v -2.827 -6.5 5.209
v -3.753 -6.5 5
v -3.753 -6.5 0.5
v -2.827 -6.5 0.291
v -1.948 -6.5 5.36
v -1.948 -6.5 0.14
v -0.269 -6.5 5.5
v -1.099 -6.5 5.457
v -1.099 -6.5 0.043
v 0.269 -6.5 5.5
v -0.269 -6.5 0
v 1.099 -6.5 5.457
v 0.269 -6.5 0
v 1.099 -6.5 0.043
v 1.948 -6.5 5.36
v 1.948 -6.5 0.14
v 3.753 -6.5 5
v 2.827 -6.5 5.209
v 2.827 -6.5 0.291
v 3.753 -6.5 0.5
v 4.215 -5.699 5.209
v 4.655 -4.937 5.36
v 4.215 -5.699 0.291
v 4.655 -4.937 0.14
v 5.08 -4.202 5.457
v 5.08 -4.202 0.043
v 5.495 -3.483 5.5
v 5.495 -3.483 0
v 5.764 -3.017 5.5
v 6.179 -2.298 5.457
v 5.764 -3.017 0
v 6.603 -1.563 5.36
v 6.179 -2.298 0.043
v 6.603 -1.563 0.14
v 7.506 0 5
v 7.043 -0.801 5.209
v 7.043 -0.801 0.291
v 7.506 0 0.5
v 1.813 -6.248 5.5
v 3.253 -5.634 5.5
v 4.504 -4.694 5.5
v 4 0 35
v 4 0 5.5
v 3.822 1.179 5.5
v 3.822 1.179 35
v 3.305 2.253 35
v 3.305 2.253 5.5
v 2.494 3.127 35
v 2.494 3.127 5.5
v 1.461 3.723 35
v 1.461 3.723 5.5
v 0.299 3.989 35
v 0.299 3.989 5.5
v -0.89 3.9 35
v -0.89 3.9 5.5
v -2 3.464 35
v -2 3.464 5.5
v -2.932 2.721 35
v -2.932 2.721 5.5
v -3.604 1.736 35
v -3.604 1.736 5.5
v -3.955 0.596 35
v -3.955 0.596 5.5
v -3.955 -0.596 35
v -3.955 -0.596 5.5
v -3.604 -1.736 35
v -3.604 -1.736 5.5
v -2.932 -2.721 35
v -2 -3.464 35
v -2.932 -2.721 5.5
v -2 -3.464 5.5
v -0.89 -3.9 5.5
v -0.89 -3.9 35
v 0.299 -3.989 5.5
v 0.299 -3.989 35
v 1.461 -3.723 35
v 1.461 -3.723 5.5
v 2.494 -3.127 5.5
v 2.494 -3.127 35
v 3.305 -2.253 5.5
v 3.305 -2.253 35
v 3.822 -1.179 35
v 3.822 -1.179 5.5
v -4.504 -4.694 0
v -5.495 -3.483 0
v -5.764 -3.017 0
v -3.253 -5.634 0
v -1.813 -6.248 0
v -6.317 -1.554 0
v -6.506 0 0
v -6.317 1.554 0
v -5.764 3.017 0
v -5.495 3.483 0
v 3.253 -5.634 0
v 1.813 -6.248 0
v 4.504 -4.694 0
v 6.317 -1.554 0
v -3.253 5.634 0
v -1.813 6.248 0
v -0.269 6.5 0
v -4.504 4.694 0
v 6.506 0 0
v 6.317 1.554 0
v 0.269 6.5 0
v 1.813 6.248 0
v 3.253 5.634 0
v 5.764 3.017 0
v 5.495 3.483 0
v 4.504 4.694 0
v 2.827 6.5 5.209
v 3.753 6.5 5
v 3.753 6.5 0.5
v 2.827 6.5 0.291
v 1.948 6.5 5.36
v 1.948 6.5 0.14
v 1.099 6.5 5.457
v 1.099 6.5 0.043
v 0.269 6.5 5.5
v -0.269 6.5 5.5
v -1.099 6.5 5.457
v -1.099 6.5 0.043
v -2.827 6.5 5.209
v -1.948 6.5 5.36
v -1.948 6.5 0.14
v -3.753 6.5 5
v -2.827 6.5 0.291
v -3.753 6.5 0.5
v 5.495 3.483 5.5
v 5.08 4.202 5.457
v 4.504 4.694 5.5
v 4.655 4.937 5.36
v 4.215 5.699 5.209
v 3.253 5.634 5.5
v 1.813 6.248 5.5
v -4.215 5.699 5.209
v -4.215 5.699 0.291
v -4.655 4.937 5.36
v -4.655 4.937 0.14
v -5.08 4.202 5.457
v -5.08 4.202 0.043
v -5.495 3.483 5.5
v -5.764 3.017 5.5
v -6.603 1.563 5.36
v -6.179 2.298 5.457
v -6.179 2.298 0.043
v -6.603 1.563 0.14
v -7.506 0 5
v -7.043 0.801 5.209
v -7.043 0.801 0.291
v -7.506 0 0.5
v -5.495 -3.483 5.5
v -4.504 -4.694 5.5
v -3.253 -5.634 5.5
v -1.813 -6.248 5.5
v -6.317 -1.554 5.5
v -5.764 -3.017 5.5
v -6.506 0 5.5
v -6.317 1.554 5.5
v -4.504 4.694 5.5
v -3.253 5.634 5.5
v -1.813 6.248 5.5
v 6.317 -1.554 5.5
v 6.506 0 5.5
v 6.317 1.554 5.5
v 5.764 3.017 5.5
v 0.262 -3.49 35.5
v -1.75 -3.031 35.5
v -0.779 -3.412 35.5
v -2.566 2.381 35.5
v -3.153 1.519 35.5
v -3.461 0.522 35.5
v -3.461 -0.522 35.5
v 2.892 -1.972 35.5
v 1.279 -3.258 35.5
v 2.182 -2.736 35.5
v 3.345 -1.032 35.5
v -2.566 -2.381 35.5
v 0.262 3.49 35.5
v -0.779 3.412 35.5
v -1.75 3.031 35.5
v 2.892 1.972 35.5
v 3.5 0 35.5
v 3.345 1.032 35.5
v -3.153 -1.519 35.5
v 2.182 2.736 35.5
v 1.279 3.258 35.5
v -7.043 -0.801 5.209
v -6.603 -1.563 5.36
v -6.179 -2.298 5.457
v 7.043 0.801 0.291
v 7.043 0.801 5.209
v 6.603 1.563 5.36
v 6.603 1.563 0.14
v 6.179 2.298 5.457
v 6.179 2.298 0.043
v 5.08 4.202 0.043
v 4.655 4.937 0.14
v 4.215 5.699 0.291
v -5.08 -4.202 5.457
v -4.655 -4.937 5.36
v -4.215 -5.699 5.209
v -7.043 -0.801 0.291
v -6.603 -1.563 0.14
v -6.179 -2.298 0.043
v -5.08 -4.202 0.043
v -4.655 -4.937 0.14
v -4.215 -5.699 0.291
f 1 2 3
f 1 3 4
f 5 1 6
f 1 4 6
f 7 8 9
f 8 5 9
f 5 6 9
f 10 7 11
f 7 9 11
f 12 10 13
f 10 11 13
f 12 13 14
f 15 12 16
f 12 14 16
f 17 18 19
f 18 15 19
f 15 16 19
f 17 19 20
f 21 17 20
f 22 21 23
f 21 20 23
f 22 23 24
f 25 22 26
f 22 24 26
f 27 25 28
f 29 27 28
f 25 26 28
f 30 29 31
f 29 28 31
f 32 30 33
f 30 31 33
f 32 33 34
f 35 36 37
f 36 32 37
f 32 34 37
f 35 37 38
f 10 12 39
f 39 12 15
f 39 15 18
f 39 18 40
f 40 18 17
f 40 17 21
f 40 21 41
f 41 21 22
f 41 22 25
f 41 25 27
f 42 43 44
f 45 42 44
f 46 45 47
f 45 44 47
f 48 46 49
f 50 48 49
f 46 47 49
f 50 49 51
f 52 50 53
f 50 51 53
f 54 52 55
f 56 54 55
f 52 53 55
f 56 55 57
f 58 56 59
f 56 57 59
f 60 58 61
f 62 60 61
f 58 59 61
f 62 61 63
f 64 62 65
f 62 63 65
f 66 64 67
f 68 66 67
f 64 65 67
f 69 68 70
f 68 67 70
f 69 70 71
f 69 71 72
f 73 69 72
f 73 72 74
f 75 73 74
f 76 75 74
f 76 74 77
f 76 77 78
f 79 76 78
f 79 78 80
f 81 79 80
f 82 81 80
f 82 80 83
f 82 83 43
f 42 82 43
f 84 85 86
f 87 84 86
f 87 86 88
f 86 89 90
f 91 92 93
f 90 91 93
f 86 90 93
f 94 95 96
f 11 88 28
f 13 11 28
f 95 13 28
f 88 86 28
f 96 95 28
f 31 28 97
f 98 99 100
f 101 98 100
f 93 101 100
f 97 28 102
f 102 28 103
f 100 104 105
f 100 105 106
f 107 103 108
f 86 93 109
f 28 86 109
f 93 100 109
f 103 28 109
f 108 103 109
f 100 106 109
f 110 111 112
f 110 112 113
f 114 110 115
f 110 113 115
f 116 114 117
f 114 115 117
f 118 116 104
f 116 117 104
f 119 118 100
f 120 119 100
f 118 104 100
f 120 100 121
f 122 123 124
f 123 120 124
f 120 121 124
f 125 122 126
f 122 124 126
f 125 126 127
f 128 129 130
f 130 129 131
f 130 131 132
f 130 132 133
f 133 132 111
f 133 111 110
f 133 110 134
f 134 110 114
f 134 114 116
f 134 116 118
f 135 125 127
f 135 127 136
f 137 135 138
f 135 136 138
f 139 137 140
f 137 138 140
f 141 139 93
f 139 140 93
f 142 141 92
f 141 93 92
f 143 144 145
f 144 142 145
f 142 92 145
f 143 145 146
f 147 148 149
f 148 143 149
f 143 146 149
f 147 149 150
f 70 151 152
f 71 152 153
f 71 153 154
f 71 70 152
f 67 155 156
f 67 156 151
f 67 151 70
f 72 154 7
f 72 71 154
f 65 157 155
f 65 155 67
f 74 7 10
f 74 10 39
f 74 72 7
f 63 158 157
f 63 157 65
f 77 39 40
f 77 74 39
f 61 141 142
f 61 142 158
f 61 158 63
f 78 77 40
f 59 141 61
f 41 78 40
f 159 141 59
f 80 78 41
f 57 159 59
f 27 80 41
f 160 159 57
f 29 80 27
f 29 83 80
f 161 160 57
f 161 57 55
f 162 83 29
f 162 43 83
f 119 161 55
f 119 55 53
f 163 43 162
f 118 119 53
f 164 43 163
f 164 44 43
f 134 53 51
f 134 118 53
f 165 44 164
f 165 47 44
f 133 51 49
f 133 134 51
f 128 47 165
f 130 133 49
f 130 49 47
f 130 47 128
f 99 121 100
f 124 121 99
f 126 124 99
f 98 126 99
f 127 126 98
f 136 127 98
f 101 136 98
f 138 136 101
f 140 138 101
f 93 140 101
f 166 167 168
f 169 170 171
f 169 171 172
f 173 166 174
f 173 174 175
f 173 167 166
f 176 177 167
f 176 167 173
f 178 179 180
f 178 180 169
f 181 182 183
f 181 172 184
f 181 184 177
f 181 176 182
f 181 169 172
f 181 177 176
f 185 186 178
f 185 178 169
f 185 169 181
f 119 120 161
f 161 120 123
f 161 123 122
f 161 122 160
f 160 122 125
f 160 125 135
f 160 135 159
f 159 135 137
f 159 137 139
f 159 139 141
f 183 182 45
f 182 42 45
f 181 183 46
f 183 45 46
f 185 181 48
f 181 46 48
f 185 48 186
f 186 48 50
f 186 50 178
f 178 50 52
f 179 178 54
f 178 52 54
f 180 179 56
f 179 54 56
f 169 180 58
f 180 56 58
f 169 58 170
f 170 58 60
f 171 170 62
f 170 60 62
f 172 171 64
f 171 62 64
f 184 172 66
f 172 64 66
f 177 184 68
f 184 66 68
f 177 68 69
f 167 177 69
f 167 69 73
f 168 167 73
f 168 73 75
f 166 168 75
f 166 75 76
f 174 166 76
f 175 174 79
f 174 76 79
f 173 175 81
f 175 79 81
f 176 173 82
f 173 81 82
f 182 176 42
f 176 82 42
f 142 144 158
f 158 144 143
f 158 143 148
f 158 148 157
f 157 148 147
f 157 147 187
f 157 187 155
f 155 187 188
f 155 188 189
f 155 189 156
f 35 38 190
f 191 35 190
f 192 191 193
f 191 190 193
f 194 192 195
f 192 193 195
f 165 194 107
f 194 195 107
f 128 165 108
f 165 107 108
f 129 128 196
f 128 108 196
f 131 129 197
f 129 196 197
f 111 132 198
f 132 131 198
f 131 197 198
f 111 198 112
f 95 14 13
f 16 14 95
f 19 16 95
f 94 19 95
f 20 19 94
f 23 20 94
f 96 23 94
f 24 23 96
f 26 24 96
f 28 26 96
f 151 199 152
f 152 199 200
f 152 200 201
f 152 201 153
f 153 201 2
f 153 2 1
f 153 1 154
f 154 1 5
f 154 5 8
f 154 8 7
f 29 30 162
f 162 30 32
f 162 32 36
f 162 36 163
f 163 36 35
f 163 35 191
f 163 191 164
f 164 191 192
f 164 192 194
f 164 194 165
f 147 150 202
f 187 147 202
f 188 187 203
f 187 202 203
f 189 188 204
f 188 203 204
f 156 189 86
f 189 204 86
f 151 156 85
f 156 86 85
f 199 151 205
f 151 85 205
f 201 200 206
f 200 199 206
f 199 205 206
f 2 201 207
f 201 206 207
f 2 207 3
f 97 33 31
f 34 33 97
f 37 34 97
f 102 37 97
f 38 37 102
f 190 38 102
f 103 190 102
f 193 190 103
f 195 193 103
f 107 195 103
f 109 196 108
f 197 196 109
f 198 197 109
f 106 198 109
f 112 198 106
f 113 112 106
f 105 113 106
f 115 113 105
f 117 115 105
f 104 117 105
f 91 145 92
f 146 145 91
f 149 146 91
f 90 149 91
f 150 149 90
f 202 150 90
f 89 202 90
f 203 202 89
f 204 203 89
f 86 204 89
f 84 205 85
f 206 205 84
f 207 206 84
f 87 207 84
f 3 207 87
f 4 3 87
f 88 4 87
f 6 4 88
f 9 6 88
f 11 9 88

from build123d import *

# Parameters (mm, degrees)
PAD008_DEPTH = 5.5
SKETCH029_R  = 4
PAD009_DEPTH = 30


with BuildPart() as part:
    # Sketch028 → Pad008 (new body)
    with BuildSketch(Plane.XY):
        Polygon((7.5055534995, 0), (3.7527767497, 6.5), (-3.7527767497, 6.5), (-7.5055534995, 0), (-3.7527767497, -6.5), (3.7527767497, -6.5), align=None)
    extrude(amount=PAD008_DEPTH)

    # Sketch029 (on Face8 of Pad008) → Pad009 (join)
    with BuildSketch(Plane.XY.offset(5.5)):
        Circle(SKETCH029_R)
    extrude(amount=PAD009_DEPTH)

    # Sketch030 → Groove001 (revolve, cut)
    with BuildSketch(Plane.XZ):
        Polygon((4, 35.5), (3.5, 35.5), (4, 35), align=None)
        Polygon((7.5055534995, 5.5), (6.5055534995, 5.5), (7.5055534995, 5), align=None)
        Polygon((7.5055534995, 0), (6.5055534995, 0), (7.5055534995, 0.5), align=None)
    revolve(axis=Axis((0, 0, 0), (0, 0, 1)), mode=Mode.SUBTRACT)


solid = part.part
